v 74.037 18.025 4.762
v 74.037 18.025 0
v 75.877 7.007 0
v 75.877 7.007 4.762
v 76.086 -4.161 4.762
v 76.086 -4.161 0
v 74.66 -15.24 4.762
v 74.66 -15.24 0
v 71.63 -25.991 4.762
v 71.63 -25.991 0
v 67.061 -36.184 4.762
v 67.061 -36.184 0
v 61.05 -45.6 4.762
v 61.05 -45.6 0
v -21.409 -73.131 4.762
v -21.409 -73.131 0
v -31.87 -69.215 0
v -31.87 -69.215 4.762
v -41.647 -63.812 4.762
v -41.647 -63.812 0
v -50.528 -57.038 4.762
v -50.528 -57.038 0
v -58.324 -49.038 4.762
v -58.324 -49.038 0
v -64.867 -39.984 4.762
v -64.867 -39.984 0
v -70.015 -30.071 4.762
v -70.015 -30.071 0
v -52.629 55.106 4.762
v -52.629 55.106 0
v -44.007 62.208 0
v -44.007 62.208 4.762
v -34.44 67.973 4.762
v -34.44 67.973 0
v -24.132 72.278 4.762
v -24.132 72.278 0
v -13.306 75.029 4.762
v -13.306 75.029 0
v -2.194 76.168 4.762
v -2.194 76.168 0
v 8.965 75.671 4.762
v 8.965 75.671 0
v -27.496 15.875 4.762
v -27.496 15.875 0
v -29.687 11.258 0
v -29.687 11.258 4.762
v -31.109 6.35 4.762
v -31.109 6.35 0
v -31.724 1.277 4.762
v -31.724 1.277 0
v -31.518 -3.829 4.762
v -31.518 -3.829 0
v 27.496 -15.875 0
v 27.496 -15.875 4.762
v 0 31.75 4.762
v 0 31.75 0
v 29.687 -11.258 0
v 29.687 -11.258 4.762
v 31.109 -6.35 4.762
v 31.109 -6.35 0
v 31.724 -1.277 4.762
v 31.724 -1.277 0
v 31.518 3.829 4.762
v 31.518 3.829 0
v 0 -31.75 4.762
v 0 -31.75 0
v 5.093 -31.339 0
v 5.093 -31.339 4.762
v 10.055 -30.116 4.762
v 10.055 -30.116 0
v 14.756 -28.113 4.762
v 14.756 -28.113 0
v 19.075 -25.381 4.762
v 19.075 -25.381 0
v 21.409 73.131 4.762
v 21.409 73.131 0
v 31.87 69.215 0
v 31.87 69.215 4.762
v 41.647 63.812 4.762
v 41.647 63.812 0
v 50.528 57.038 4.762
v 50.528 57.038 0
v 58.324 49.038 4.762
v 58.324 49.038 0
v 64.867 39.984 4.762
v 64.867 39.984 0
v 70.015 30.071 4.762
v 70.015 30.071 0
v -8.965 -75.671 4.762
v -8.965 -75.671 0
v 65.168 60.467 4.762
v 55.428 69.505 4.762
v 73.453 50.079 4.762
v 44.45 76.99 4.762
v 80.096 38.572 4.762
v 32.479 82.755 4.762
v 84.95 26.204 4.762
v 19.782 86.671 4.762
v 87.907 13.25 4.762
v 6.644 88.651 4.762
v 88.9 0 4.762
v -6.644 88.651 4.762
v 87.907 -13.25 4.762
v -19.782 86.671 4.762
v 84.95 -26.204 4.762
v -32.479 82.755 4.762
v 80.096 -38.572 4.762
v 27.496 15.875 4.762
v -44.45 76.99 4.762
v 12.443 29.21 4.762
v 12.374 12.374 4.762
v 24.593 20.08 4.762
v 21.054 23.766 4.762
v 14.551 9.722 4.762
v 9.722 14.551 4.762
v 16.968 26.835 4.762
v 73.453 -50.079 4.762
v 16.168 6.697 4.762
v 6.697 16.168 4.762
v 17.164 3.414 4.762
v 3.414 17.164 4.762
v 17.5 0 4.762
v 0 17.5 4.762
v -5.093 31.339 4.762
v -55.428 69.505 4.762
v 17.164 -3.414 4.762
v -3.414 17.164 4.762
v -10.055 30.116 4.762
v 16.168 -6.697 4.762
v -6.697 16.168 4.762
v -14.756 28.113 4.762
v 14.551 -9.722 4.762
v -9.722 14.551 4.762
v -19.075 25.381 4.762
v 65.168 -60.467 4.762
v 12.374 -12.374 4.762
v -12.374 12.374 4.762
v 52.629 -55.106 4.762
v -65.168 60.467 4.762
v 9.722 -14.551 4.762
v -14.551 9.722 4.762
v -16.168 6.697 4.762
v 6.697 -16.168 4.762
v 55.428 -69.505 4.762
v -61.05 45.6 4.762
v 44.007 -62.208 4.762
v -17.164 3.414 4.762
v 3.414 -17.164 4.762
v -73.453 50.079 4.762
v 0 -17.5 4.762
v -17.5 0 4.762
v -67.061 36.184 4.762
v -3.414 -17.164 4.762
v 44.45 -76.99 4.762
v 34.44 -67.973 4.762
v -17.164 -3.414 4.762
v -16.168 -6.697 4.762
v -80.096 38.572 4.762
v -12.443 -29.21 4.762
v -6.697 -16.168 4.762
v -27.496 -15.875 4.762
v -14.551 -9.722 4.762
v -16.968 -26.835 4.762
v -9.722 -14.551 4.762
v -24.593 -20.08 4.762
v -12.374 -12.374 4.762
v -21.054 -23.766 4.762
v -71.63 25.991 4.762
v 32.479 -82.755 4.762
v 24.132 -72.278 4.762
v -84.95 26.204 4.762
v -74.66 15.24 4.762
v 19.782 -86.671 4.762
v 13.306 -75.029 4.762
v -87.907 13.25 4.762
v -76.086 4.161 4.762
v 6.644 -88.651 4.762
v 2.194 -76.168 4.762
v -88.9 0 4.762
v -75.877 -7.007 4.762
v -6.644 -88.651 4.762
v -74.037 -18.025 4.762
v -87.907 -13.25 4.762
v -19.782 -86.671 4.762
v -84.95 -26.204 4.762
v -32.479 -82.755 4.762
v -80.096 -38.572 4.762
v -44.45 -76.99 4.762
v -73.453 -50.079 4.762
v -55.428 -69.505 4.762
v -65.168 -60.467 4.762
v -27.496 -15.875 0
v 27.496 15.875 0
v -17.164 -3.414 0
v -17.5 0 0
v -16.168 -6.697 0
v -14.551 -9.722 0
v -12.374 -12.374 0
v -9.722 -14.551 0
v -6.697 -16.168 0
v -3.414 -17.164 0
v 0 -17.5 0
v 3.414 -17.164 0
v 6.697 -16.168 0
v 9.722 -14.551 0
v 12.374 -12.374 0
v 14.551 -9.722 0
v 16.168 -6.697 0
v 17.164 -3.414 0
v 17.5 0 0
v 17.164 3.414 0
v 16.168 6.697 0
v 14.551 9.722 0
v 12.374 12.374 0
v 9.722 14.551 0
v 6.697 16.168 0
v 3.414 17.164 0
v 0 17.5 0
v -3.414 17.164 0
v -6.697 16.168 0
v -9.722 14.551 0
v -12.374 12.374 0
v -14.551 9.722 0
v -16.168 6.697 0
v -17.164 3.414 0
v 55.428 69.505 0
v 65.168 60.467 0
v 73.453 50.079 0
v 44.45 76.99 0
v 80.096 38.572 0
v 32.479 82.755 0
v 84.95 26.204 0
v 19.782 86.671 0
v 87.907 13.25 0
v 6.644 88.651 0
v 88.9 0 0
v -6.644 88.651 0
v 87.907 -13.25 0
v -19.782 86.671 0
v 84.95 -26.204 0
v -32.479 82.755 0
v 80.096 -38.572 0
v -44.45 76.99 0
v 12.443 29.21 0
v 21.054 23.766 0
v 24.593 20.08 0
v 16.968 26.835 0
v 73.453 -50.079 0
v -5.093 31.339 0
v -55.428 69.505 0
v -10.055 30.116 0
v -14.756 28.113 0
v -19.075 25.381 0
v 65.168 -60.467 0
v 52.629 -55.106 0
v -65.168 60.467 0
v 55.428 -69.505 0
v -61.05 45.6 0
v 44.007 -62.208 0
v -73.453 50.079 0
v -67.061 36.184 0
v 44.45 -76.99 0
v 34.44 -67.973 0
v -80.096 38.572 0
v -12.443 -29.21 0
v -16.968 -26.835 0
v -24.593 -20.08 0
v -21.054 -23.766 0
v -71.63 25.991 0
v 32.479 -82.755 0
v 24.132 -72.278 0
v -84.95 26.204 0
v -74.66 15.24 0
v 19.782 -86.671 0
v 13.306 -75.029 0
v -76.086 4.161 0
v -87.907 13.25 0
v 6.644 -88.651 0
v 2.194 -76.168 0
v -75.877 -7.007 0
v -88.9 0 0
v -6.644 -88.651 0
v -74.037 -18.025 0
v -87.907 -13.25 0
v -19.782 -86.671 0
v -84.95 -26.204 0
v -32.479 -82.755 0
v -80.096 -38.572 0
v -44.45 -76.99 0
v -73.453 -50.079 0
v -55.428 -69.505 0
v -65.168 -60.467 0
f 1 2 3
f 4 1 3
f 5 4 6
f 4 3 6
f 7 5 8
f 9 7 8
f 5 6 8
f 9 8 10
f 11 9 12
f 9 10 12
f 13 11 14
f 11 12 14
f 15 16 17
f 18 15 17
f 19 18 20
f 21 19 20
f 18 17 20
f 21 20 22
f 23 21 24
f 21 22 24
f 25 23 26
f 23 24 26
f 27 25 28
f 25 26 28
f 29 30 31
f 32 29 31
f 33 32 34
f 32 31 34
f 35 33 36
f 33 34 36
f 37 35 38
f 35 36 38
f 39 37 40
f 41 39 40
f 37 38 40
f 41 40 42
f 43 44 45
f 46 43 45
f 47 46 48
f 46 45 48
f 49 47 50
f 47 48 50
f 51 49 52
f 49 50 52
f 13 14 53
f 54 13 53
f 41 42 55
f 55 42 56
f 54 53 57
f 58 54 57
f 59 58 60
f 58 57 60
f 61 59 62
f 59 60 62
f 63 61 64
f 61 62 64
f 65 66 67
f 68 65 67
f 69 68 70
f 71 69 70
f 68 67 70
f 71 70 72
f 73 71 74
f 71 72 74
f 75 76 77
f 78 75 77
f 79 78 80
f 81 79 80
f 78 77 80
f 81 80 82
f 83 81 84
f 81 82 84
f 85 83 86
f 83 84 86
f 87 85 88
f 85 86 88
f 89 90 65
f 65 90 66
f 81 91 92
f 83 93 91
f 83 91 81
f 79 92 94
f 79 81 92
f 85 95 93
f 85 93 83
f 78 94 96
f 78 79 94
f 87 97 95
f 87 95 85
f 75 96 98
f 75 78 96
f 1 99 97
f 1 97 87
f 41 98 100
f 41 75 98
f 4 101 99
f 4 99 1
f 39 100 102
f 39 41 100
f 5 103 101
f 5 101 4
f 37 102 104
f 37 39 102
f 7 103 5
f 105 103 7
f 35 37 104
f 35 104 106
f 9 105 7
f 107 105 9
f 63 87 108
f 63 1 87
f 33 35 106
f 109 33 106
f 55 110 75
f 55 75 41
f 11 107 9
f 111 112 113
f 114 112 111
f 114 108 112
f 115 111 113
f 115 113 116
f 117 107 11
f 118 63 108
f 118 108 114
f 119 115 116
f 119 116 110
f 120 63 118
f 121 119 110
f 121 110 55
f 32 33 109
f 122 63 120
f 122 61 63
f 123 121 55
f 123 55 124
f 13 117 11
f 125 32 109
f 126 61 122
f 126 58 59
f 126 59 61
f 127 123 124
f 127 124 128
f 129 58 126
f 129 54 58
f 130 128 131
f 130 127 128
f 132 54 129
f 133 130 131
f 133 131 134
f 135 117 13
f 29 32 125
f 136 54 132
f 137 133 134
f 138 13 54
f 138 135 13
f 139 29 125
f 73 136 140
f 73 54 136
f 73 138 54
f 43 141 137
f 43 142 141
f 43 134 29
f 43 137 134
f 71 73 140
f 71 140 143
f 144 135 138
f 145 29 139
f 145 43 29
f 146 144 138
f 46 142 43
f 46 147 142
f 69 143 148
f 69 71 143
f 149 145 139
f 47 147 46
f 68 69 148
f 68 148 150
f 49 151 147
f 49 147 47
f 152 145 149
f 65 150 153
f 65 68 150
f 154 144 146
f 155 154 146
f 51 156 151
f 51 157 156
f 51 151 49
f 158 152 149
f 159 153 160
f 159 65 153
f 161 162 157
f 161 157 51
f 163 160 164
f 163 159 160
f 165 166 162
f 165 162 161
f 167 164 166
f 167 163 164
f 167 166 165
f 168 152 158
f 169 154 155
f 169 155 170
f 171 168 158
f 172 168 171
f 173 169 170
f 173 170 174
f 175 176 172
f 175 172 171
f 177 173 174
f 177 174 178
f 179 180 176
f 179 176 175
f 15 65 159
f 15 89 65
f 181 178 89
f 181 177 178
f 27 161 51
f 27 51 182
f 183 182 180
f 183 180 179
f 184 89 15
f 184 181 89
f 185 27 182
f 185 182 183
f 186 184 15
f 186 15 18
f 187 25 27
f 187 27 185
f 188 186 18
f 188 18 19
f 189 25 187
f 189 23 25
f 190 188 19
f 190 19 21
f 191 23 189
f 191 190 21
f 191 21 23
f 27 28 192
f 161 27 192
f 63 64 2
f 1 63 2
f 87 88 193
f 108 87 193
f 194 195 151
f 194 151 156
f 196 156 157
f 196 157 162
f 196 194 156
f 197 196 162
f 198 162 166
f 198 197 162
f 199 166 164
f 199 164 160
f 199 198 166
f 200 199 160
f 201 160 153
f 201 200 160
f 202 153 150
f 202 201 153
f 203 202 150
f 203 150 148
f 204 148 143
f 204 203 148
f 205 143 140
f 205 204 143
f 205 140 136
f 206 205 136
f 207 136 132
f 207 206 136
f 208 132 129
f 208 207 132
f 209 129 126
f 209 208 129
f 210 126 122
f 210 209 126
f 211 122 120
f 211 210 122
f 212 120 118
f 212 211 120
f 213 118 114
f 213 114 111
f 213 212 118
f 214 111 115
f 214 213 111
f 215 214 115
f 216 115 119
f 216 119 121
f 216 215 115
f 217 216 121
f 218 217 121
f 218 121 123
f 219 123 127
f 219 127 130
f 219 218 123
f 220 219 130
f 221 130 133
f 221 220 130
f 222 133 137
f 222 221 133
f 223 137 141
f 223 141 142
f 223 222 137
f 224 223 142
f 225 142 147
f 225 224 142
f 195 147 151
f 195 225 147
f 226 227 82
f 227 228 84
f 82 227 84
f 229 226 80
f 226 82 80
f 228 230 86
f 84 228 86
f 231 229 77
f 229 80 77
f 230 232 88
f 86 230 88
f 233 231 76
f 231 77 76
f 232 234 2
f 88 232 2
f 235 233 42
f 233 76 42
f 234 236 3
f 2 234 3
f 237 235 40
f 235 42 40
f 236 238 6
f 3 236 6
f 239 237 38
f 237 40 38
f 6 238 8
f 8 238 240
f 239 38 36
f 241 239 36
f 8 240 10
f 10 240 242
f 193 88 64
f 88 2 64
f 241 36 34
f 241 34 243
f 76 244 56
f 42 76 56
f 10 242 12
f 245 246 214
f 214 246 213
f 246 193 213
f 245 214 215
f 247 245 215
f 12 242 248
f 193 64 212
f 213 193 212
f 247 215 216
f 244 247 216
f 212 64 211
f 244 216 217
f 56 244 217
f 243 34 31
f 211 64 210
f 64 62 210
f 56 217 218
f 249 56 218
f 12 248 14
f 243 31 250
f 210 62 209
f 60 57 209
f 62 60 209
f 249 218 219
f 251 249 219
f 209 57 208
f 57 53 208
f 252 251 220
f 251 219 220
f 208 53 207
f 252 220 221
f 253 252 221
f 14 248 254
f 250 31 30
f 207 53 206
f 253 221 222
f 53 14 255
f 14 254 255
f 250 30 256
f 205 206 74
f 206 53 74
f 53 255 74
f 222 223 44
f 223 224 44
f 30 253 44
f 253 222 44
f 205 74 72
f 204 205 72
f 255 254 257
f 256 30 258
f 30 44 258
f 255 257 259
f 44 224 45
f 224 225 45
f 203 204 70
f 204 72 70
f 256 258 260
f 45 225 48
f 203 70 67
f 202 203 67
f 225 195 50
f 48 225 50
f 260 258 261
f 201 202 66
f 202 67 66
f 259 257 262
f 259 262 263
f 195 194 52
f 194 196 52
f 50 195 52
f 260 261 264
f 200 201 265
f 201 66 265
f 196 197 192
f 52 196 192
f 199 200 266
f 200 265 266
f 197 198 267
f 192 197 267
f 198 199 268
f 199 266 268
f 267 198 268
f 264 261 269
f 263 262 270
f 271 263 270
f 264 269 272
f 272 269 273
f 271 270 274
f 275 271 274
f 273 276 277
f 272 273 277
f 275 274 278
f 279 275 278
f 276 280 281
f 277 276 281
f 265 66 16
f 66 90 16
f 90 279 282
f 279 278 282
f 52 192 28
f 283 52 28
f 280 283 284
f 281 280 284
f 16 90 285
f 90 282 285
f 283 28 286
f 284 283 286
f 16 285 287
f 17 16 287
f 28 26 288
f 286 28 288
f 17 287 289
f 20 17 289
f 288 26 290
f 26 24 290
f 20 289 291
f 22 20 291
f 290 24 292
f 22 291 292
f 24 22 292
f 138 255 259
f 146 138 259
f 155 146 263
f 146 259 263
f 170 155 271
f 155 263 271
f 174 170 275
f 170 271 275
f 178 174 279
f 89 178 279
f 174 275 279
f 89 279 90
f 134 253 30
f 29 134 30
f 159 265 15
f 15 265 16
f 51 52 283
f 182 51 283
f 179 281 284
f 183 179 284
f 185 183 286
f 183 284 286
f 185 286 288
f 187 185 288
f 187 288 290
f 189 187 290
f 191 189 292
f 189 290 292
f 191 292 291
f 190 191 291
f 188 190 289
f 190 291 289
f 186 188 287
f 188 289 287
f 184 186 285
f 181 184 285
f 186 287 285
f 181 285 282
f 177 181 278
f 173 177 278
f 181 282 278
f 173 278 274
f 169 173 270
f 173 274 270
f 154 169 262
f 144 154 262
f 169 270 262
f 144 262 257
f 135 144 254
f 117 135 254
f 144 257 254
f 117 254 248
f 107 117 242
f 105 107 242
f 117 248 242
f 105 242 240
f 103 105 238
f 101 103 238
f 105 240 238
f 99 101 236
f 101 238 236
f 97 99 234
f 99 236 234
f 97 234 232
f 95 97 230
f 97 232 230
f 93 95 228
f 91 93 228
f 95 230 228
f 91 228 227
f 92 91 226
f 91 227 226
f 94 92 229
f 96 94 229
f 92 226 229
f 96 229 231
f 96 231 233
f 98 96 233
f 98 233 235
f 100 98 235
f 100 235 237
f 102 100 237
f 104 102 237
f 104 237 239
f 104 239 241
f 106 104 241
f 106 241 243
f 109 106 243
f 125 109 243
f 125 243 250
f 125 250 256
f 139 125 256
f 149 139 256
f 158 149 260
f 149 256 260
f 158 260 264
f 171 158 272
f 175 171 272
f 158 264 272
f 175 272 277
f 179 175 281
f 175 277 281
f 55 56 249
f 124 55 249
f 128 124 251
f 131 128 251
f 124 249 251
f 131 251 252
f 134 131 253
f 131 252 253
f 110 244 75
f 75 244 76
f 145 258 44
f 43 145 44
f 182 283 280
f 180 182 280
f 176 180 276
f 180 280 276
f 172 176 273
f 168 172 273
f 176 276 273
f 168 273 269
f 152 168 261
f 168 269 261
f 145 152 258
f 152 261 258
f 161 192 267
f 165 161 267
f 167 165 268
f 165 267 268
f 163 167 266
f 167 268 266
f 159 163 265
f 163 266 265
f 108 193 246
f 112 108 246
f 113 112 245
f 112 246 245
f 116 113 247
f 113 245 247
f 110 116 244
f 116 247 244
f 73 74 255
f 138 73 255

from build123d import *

# Parameters (mm, degrees)
SKETCH1_R           = 88.9
SKETCH1_R_2         = 17.5
BOSS_EXTRUDE1_DEPTH = 4.7625


with BuildPart() as part:
    # Sketch1 → Boss-Extrude1 (new body)
    with BuildSketch(Plane.XY):
        with Locations(Location((0, 0, 0), (0, 0, 180))):
            Circle(SKETCH1_R)
        with Locations(Location((0, 0, 0), (0, 0, 180))):
            Circle(SKETCH1_R_2, mode=Mode.SUBTRACT)
        with BuildLine():
            Line((8.965287197, 75.670758061), (0, 31.75))
            ThreePointArc((0, 31.75), (-10.054998553, 30.115768363), (-19.074898098, 25.381307345))
            Line((-19.074898098, 25.381307345), (-52.628746733, 55.10585284))
            ThreePointArc((-52.628746733, 55.10585284), (-24.131996526, 72.277844072), (8.965287197, 75.670758061))
        make_face(mode=Mode.SUBTRACT)
        with BuildLine():
            Line((70.015442403, 30.071212565), (27.49630657, 15.875))
            ThreePointArc((27.49630657, 15.875), (21.053521181, 23.765768363), (12.443407893, 29.21))
            Line((12.443407893, 29.21), (21.40869509, 73.130758061))
            ThreePointArc((21.40869509, 73.130758061), (50.528450834, 57.037844072), (70.015442403, 30.071212565))
        make_face(mode=Mode.SUBTRACT)
        with BuildLine():
            Line((61.050155206, -45.599545495), (27.49630657, -15.875))
            ThreePointArc((27.49630657, -15.875), (31.108519733, -6.35), (31.518305991, 3.828692655))
            Line((31.518305991, 3.828692655), (74.037441824, 18.02490522))
            ThreePointArc((74.037441824, 18.02490522), (74.66044736, -15.24), (61.050155206, -45.599545495))
        make_face(mode=Mode.SUBTRACT)
        with BuildLine():
            Line((-8.965287197, -75.670758061), (0, -31.75))
            ThreePointArc((0, -31.75), (10.054998553, -30.115768363), (19.074898098, -25.381307345))
            Line((19.074898098, -25.381307345), (52.628746733, -55.10585284))
            ThreePointArc((52.628746733, -55.10585284), (24.131996526, -72.277844072), (-8.965287197, -75.670758061))
        make_face(mode=Mode.SUBTRACT)
        with BuildLine():
            Line((-70.015442403, -30.071212565), (-27.49630657, -15.875))
            ThreePointArc((-27.49630657, -15.875), (-21.053521181, -23.765768363), (-12.443407893, -29.21))
            Line((-12.443407893, -29.21), (-21.40869509, -73.130758061))
            ThreePointArc((-21.40869509, -73.130758061), (-50.528450834, -57.037844072), (-70.015442403, -30.071212565))
        make_face(mode=Mode.SUBTRACT)
        with BuildLine():
            Line((-61.050155206, 45.599545495), (-27.49630657, 15.875))
            ThreePointArc((-27.49630657, 15.875), (-31.108519733, 6.35), (-31.518305991, -3.828692655))
            Line((-31.518305991, -3.828692655), (-74.037441824, -18.02490522))
            ThreePointArc((-74.037441824, -18.02490522), (-74.66044736, 15.24), (-61.050155206, 45.599545495))
        make_face(mode=Mode.SUBTRACT)
    extrude(amount=BOSS_EXTRUDE1_DEPTH)


solid = part.part
